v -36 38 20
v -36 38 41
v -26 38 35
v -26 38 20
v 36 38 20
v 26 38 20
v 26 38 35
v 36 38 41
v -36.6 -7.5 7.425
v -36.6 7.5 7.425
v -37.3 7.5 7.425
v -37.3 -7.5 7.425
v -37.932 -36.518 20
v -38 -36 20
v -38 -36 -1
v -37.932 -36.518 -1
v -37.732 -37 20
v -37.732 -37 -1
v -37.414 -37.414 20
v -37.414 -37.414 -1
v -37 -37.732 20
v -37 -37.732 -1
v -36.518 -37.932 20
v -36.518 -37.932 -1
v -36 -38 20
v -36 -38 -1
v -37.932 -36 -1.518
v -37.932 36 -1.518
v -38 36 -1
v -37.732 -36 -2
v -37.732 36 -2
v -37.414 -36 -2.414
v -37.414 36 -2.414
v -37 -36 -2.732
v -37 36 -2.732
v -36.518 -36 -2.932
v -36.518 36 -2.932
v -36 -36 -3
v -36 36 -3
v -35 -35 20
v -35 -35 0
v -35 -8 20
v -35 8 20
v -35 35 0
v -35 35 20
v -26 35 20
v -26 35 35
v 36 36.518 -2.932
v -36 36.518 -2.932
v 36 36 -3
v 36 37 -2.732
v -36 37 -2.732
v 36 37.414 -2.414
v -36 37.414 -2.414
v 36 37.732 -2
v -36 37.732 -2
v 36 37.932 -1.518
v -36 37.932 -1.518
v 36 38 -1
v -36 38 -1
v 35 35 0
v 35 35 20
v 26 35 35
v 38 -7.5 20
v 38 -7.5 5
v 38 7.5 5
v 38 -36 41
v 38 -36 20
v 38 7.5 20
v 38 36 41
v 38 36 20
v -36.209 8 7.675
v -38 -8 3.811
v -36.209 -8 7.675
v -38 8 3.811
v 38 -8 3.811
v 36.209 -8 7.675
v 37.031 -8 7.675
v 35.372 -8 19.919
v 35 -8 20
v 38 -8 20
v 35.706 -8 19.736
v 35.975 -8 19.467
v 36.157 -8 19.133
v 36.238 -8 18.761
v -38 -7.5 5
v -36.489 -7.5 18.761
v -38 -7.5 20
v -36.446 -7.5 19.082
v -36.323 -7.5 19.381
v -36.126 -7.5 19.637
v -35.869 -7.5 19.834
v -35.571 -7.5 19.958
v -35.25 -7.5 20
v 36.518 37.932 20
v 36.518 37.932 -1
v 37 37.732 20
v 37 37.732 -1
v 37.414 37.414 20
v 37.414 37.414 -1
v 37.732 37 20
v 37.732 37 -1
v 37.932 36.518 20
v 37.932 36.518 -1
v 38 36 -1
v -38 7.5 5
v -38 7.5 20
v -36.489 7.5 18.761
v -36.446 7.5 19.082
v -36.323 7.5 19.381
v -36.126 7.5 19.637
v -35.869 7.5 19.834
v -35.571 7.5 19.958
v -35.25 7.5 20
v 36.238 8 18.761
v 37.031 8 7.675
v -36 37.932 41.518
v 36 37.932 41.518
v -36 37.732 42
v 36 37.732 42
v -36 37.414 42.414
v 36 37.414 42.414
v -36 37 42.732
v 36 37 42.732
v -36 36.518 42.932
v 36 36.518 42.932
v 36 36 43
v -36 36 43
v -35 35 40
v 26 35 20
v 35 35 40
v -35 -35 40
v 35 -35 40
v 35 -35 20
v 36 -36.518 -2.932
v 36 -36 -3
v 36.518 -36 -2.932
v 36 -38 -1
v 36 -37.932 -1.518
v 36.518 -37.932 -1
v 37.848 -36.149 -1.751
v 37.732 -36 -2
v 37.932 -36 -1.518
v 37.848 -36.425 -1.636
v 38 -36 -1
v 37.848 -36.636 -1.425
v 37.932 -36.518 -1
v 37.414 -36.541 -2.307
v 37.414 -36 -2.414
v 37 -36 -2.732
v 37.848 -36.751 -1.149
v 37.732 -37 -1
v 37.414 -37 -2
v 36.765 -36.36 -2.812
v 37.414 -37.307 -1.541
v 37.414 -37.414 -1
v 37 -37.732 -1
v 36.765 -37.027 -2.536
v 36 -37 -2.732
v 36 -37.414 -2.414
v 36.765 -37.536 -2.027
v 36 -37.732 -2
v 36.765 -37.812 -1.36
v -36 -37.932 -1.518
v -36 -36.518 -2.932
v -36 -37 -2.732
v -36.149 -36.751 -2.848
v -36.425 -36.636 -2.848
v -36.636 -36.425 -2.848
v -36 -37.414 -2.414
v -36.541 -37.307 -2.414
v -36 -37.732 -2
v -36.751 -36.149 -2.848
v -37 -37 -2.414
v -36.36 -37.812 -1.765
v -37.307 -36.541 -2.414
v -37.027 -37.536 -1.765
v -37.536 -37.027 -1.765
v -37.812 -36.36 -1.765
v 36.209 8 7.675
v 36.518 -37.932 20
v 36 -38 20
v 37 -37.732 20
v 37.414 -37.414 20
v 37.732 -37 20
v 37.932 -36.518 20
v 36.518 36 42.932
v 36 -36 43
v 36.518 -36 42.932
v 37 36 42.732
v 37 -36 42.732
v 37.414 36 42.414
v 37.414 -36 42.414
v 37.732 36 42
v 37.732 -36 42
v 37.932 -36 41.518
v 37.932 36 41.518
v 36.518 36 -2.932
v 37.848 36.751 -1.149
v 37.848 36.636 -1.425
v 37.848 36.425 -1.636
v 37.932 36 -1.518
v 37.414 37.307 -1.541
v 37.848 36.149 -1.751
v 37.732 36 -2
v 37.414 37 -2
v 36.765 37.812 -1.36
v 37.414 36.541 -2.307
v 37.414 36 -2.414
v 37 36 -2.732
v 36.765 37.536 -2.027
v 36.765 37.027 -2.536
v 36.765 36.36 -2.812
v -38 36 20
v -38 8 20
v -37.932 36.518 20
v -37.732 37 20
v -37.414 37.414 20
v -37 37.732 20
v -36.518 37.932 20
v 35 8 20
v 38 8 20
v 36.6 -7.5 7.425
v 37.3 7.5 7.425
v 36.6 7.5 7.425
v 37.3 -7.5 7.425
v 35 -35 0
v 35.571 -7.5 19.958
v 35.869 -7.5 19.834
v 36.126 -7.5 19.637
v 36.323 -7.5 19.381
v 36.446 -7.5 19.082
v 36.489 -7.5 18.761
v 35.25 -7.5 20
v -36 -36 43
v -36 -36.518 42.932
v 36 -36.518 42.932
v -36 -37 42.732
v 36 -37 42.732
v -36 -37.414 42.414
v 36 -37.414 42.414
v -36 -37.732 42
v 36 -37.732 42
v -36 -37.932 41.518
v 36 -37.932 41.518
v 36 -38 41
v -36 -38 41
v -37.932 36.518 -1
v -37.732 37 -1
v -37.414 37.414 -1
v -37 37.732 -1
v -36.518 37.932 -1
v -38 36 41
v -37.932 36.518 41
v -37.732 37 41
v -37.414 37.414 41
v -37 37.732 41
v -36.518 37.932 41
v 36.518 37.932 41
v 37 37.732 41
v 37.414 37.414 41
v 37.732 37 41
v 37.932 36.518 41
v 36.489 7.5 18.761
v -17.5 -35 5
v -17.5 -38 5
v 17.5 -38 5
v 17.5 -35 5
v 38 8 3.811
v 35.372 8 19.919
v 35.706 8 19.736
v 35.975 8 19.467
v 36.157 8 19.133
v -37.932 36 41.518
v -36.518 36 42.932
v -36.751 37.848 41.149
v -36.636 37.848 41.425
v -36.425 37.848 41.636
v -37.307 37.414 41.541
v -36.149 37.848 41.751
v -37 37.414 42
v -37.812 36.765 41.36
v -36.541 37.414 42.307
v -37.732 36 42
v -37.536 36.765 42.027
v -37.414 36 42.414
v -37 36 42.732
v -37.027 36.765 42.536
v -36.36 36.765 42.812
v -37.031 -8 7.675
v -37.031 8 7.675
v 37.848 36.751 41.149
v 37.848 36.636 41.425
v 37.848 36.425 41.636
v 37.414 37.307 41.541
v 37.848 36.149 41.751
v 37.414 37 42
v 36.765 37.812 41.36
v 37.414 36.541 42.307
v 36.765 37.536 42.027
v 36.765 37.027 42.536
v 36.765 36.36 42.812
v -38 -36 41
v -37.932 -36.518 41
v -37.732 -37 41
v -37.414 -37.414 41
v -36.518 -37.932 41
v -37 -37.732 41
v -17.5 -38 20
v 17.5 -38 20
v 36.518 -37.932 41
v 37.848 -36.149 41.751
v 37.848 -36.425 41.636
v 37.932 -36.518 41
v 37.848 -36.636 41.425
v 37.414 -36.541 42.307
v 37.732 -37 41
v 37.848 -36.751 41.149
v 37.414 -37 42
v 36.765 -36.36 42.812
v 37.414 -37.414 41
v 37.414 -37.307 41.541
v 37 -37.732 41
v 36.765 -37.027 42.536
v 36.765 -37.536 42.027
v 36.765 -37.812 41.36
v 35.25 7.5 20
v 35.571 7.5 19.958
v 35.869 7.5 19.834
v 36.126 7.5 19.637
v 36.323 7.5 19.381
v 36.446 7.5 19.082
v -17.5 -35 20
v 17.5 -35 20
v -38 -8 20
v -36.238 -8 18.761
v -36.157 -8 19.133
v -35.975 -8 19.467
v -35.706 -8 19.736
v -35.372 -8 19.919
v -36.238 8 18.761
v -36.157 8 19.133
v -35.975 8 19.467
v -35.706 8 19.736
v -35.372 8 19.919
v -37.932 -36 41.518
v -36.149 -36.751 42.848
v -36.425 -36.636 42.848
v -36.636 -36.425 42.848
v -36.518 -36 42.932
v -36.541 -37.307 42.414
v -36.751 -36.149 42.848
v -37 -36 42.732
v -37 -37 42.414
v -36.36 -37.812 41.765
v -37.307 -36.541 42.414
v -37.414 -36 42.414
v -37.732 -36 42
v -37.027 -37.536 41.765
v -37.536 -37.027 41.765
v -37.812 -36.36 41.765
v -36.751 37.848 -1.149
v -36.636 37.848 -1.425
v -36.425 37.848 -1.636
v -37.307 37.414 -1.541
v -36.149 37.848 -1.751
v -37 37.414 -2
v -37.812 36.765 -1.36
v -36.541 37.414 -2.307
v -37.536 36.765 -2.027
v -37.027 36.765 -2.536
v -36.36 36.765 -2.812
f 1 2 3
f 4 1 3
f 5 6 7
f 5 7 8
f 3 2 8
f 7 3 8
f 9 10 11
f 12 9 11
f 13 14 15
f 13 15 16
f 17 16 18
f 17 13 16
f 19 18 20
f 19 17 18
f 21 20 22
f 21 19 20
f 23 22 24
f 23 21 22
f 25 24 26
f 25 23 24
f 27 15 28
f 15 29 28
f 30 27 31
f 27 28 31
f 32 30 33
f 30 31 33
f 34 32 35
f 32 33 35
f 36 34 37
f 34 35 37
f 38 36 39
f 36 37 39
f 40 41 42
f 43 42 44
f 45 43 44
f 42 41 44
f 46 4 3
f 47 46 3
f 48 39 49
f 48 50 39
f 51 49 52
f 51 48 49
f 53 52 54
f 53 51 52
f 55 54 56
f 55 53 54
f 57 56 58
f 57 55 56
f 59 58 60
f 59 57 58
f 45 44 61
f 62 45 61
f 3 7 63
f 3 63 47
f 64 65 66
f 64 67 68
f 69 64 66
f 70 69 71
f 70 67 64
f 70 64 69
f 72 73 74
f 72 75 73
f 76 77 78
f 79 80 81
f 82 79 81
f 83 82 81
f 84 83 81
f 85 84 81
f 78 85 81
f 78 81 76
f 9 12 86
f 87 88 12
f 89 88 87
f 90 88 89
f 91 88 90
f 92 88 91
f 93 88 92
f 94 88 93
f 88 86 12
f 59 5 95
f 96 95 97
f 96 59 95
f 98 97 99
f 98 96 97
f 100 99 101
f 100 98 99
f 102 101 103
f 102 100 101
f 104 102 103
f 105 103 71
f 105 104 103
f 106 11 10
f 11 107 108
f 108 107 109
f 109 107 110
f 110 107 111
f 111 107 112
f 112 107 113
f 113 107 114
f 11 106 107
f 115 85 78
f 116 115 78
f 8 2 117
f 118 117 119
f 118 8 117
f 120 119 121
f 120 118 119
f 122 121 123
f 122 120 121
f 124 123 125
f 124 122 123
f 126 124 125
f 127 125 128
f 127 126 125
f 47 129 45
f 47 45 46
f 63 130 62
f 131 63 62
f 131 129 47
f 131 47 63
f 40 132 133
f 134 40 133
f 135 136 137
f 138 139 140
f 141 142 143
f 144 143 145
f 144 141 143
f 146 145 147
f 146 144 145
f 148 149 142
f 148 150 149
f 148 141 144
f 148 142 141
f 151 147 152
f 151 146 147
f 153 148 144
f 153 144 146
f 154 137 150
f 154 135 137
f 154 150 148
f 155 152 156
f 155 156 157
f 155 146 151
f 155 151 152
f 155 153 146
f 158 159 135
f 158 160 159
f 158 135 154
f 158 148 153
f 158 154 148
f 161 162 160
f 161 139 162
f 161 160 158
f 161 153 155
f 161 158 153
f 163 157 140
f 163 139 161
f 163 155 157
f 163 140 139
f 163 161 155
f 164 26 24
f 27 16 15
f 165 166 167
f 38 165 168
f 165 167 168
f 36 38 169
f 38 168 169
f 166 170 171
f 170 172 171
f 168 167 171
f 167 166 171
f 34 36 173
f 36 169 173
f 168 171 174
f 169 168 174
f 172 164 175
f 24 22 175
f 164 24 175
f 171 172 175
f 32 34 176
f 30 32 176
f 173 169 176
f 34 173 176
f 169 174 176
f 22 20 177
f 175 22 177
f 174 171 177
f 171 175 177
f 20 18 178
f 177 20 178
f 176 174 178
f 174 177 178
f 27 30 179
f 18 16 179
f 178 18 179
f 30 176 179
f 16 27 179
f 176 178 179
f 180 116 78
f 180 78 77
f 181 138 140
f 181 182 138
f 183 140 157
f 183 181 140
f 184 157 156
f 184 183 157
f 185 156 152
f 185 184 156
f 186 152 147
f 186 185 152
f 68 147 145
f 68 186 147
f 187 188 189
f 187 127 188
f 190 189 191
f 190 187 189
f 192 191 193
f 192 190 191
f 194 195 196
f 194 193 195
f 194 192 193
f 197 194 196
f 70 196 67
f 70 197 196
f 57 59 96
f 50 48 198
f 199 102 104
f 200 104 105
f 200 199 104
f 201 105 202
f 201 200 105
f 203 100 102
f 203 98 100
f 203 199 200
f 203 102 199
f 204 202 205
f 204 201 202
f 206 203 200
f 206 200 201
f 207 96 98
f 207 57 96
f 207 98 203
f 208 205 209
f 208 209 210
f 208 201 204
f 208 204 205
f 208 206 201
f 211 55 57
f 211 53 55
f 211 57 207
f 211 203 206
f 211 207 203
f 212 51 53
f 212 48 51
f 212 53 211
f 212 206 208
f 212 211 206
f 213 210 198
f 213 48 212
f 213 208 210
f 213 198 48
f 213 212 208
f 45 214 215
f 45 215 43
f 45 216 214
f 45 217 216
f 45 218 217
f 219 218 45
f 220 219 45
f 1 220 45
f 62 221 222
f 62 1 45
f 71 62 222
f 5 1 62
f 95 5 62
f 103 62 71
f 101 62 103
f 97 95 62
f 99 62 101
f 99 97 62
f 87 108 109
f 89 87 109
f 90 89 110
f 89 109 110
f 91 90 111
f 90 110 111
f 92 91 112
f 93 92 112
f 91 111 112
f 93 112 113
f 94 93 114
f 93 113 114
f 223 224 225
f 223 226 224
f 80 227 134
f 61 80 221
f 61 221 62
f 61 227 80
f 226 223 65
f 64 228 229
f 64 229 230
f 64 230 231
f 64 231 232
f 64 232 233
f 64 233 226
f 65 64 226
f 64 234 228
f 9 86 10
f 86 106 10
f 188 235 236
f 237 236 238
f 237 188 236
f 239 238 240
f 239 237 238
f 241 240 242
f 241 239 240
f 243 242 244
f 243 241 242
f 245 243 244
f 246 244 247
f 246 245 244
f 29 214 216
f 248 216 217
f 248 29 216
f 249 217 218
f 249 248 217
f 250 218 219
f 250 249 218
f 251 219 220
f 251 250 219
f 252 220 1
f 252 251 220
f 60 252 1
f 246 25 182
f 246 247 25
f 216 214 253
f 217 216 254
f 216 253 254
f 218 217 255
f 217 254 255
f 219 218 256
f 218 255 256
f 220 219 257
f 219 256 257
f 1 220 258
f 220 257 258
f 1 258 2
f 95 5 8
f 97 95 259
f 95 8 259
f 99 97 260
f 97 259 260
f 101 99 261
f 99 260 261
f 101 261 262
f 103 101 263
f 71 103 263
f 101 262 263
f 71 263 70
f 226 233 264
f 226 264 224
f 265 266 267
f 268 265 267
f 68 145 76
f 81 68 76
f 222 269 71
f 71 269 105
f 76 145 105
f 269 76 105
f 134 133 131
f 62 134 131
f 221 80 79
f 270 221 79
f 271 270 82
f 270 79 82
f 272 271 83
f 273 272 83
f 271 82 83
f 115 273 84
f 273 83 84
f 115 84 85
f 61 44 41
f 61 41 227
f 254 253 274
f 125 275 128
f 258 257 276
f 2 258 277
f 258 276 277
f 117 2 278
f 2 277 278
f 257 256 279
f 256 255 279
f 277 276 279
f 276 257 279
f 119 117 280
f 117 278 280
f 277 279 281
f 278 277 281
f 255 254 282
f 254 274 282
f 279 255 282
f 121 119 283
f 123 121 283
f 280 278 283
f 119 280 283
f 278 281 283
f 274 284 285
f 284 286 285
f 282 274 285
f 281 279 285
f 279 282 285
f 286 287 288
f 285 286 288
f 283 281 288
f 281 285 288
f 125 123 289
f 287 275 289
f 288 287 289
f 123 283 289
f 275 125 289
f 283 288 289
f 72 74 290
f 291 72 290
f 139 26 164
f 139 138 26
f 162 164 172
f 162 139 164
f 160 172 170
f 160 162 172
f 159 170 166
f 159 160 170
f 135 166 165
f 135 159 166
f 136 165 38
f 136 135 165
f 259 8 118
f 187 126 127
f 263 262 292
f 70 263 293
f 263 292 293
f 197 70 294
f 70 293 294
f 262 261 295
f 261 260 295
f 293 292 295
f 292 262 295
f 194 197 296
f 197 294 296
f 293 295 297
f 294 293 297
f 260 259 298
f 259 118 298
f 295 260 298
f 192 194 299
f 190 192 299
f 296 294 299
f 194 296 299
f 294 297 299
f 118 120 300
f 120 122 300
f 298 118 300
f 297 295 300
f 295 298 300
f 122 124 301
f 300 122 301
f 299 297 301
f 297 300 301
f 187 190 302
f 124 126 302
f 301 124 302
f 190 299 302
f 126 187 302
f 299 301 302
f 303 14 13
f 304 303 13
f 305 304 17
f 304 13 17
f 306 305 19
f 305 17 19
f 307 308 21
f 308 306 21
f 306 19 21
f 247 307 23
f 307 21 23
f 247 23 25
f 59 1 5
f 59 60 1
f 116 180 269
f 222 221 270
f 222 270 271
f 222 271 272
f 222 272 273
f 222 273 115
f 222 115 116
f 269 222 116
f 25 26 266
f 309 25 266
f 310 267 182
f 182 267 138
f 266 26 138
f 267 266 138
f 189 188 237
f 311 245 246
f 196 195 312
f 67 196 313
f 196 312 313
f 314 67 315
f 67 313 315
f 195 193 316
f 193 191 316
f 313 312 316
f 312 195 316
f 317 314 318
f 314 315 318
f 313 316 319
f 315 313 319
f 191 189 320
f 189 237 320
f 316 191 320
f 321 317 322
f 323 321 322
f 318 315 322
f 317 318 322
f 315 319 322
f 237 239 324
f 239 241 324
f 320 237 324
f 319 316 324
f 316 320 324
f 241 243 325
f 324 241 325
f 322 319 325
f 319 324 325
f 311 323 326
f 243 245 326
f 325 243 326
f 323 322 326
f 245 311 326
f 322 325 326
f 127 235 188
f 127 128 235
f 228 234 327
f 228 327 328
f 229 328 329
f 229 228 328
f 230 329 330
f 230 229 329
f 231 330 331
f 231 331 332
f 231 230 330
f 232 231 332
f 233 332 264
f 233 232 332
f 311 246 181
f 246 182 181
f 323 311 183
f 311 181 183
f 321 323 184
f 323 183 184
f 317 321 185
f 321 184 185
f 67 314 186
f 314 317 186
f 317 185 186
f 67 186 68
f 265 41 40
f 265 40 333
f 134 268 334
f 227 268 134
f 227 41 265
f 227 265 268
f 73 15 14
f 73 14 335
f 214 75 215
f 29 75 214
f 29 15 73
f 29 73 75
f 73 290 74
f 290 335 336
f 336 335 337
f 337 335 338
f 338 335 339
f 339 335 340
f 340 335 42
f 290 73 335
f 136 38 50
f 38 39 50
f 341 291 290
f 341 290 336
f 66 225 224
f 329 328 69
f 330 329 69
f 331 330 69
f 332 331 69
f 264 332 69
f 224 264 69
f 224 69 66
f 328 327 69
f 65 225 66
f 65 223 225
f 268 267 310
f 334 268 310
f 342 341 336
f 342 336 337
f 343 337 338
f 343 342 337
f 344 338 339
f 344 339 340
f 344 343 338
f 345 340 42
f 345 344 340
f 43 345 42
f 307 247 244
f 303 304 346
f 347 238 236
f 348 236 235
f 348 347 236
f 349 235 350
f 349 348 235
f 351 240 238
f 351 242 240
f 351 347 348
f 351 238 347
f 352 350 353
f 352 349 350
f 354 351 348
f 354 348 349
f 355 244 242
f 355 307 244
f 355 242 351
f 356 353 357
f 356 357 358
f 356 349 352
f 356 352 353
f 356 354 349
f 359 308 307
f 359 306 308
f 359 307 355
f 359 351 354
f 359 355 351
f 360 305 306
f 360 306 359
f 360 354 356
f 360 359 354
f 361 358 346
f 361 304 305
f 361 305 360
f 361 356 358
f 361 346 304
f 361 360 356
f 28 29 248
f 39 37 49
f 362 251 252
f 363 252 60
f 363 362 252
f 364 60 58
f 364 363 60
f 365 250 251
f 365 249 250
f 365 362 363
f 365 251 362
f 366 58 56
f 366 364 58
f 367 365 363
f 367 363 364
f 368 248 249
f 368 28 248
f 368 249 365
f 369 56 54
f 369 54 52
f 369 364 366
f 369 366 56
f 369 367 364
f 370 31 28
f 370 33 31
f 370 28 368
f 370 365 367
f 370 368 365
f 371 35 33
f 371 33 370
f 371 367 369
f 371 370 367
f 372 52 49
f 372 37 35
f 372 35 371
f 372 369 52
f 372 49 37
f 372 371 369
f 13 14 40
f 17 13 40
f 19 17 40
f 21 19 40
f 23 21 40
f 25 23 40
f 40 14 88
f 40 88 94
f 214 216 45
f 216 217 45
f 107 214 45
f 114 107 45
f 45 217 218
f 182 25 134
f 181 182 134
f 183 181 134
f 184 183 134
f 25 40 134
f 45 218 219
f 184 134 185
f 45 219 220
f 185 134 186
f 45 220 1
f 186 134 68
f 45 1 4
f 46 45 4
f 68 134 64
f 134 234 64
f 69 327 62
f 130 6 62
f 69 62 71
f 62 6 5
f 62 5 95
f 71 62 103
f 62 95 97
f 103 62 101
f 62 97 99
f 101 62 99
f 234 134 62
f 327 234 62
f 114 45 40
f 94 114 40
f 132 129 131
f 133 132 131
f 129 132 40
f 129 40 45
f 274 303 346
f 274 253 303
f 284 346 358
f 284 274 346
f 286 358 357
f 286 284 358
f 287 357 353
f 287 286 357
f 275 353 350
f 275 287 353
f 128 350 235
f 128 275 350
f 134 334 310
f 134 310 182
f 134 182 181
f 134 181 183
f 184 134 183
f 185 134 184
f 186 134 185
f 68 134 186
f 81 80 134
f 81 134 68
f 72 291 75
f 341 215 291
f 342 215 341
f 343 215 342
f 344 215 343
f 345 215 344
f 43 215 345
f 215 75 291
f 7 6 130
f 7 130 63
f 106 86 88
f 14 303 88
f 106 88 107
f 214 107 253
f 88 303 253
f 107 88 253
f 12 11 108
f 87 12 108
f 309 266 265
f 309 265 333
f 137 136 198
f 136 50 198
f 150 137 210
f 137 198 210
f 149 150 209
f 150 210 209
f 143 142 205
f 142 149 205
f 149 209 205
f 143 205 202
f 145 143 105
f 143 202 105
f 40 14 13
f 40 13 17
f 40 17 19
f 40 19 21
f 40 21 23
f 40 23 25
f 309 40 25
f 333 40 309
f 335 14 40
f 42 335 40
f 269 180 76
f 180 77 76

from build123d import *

# Parameters (mm, degrees)
F0_W      = 76
F0_H      = 76
F0_W_2    = 70
F0_H_2    = 70
F1_DEPTH  = 3
F2_DEPTH  = 20
F4_W      = 35
F4_H      = 15
F5_DEPTH  = 3
F6_W      = 52
F6_H      = 15
F7_DEPTH  = 3
F9_DEPTH  = 8
F10_DEPTH = 7.5
F11_R     = 2
F11_2_R   = 2


with BuildPart() as f1:
    # F0 (on Top) → F1 (new body)
    with BuildSketch(Plane.XY):
        Rectangle(F0_W, F0_H)
        Rectangle(F0_W_2, F0_H_2, mode=Mode.SUBTRACT)
        Rectangle(F0_W_2, F0_H_2)
    extrude(amount=-F1_DEPTH)

    # F0 (on Top) → F2 (join)
    with BuildSketch(Plane.XY):
        Rectangle(F0_W, F0_H)
        Rectangle(F0_W_2, F0_H_2, mode=Mode.SUBTRACT)
    extrude(amount=F2_DEPTH)


with BuildPart() as f3_1:
    # F3: instance of F1
    add(f1.part.mirror(Plane.XY.offset(20)))

    # F6 (on face) → F7 (cut, through all)
    with BuildSketch(Plane(origin=(0, 38, 0), x_dir=(-1, 0, 0), z_dir=(0, 1, 0))):
        with Locations((0, 27.5)):
            Rectangle(F6_W, F6_H)
    extrude(amount=-F7_DEPTH, mode=Mode.SUBTRACT)

    # F8 (on Front) → F10 (join, symmetric)
    with BuildSketch(Plane.XZ):
        with BuildLine():
            ThreePointArc((-36.4886499851, 18.7613500149), (-36.125857804, 19.6372078189), (-35.25, 20))
            Line((-35.25, 20), (-38, 20))
            Line((-38, 20), (-38, 5))
            Line((-38, 5), (-36.6, 7.4248711306))
            Line((-36.6, 7.4248711306), (-37.3, 7.4248711306))
            Line((-37.3, 7.4248711306), (-36.4886499851, 18.7613500149))
        make_face()
        with BuildLine():
            Line((38, 5), (38, 20))
            Line((38, 20), (36.4, 20))
            Line((36.4, 20), (35.25, 20))
            ThreePointArc((35.25, 20), (36.125857804, 19.6372078189), (36.4886499851, 18.7613500149))
            Line((36.4886499851, 18.7613500149), (37.3, 7.4248711306))
            Line((37.3, 7.4248711306), (36.6, 7.4248711306))
            Line((36.6, 7.4248711306), (38, 5))
        make_face()
    extrude(amount=F10_DEPTH, both=True)

    # F11
    f11_edges = [f3_1.edges().sort_by_distance(p)[0] for p in [
        (-38, -38, 31.5),
        (0, -38, 43),
        (-38, 0, 43),
        (-38, 38, 31.5),
        (0, 38, 43),
        (38, 38, 31.5),
        (38, 0, 43),
        (38, -38, 31.5),
    ]]
    fillet(f11_edges, radius=F11_R)


with BuildPart() as f1_1:
    add(f1.part)

    # F4 (on face) → F5 (cut, through all)
    with BuildSketch(Plane.XZ.offset(38)):
        with Locations((0, 12.5)):
            Rectangle(F4_W, F4_H)
    extrude(amount=-F5_DEPTH, mode=Mode.SUBTRACT)

    # F8 (on Front) → F9 (cut, symmetric)
    with BuildSketch(Plane.XZ):
        with BuildLine():
            ThreePointArc((-36.2380105226, 18.7613500149), (-35.8498934739, 19.6114440223), (-35, 20))
            Line((-35, 20), (-35.25, 20))
            ThreePointArc((-35.25, 20), (-36.125857804, 19.6372078189), (-36.4886499851, 18.7613500149))
            Line((-36.4886499851, 18.7613500149), (-37.3, 7.4248711306))
            Line((-37.3, 7.4248711306), (-36.6, 7.4248711306))
            Line((-36.6, 7.4248711306), (-38, 5))
            Line((-38, 5), (-38, 3.8114462404))
            Line((-38, 3.8114462404), (-36.2085029195, 7.6748711306))
            Line((-36.2085029195, 7.6748711306), (-37.0314680767, 7.6748711306))
            Line((-37.0314680767, 7.6748711306), (-36.2380105226, 18.7613500149))
        make_face()
        with BuildLine():
            ThreePointArc((-36.4886499851, 18.7613500149), (-36.125857804, 19.6372078189), (-35.25, 20))
            Line((-35.25, 20), (-38, 20))
            Line((-38, 20), (-38, 5))
            Line((-38, 5), (-36.6, 7.4248711306))
            Line((-36.6, 7.4248711306), (-37.3, 7.4248711306))
            Line((-37.3, 7.4248711306), (-36.4886499851, 18.7613500149))
        make_face()
        with BuildLine():
            Line((38, 5), (38, 20))
            Line((38, 20), (36.4, 20))
            Line((36.4, 20), (35.25, 20))
            ThreePointArc((35.25, 20), (36.125857804, 19.6372078189), (36.4886499851, 18.7613500149))
            Line((36.4886499851, 18.7613500149), (37.3, 7.4248711306))
            Line((37.3, 7.4248711306), (36.6, 7.4248711306))
            Line((36.6, 7.4248711306), (38, 5))
        make_face()
        with BuildLine():
            Line((38, 3.8114462404), (38, 5))
            Line((38, 5), (36.6, 7.4248711306))
            Line((36.6, 7.4248711306), (37.3, 7.4248711306))
            Line((37.3, 7.4248711306), (36.4886499851, 18.7613500149))
            ThreePointArc((36.4886499851, 18.7613500149), (36.125857804, 19.6372078189), (35.25, 20))
            Line((35.25, 20), (35, 20))
            ThreePointArc((35, 20), (35.8498934739, 19.6114440223), (36.2380105226, 18.7613500149))
            Line((36.2380105226, 18.7613500149), (37.0314680767, 7.6748711306))
            Line((37.0314680767, 7.6748711306), (36.2085029195, 7.6748711306))
            Line((36.2085029195, 7.6748711306), (38, 3.8114462404))
        make_face()
    extrude(amount=F9_DEPTH, both=True, mode=Mode.SUBTRACT)

    # F11#2
    f11_2_edges = [f1_1.edges().sort_by_distance(p)[0] for p in [
        (-38, -38, 8.5),
        (0, -38, -3),
        (-38, 0, -3),
        (-38, 38, 8.5),
        (0, 38, -3),
        (38, 38, 8.5),
        (38, 0, -3),
        (38, -38, 8.5),
    ]]
    fillet(f11_2_edges, radius=F11_2_R)


solid = Compound([f3_1.part, f1_1.part])
